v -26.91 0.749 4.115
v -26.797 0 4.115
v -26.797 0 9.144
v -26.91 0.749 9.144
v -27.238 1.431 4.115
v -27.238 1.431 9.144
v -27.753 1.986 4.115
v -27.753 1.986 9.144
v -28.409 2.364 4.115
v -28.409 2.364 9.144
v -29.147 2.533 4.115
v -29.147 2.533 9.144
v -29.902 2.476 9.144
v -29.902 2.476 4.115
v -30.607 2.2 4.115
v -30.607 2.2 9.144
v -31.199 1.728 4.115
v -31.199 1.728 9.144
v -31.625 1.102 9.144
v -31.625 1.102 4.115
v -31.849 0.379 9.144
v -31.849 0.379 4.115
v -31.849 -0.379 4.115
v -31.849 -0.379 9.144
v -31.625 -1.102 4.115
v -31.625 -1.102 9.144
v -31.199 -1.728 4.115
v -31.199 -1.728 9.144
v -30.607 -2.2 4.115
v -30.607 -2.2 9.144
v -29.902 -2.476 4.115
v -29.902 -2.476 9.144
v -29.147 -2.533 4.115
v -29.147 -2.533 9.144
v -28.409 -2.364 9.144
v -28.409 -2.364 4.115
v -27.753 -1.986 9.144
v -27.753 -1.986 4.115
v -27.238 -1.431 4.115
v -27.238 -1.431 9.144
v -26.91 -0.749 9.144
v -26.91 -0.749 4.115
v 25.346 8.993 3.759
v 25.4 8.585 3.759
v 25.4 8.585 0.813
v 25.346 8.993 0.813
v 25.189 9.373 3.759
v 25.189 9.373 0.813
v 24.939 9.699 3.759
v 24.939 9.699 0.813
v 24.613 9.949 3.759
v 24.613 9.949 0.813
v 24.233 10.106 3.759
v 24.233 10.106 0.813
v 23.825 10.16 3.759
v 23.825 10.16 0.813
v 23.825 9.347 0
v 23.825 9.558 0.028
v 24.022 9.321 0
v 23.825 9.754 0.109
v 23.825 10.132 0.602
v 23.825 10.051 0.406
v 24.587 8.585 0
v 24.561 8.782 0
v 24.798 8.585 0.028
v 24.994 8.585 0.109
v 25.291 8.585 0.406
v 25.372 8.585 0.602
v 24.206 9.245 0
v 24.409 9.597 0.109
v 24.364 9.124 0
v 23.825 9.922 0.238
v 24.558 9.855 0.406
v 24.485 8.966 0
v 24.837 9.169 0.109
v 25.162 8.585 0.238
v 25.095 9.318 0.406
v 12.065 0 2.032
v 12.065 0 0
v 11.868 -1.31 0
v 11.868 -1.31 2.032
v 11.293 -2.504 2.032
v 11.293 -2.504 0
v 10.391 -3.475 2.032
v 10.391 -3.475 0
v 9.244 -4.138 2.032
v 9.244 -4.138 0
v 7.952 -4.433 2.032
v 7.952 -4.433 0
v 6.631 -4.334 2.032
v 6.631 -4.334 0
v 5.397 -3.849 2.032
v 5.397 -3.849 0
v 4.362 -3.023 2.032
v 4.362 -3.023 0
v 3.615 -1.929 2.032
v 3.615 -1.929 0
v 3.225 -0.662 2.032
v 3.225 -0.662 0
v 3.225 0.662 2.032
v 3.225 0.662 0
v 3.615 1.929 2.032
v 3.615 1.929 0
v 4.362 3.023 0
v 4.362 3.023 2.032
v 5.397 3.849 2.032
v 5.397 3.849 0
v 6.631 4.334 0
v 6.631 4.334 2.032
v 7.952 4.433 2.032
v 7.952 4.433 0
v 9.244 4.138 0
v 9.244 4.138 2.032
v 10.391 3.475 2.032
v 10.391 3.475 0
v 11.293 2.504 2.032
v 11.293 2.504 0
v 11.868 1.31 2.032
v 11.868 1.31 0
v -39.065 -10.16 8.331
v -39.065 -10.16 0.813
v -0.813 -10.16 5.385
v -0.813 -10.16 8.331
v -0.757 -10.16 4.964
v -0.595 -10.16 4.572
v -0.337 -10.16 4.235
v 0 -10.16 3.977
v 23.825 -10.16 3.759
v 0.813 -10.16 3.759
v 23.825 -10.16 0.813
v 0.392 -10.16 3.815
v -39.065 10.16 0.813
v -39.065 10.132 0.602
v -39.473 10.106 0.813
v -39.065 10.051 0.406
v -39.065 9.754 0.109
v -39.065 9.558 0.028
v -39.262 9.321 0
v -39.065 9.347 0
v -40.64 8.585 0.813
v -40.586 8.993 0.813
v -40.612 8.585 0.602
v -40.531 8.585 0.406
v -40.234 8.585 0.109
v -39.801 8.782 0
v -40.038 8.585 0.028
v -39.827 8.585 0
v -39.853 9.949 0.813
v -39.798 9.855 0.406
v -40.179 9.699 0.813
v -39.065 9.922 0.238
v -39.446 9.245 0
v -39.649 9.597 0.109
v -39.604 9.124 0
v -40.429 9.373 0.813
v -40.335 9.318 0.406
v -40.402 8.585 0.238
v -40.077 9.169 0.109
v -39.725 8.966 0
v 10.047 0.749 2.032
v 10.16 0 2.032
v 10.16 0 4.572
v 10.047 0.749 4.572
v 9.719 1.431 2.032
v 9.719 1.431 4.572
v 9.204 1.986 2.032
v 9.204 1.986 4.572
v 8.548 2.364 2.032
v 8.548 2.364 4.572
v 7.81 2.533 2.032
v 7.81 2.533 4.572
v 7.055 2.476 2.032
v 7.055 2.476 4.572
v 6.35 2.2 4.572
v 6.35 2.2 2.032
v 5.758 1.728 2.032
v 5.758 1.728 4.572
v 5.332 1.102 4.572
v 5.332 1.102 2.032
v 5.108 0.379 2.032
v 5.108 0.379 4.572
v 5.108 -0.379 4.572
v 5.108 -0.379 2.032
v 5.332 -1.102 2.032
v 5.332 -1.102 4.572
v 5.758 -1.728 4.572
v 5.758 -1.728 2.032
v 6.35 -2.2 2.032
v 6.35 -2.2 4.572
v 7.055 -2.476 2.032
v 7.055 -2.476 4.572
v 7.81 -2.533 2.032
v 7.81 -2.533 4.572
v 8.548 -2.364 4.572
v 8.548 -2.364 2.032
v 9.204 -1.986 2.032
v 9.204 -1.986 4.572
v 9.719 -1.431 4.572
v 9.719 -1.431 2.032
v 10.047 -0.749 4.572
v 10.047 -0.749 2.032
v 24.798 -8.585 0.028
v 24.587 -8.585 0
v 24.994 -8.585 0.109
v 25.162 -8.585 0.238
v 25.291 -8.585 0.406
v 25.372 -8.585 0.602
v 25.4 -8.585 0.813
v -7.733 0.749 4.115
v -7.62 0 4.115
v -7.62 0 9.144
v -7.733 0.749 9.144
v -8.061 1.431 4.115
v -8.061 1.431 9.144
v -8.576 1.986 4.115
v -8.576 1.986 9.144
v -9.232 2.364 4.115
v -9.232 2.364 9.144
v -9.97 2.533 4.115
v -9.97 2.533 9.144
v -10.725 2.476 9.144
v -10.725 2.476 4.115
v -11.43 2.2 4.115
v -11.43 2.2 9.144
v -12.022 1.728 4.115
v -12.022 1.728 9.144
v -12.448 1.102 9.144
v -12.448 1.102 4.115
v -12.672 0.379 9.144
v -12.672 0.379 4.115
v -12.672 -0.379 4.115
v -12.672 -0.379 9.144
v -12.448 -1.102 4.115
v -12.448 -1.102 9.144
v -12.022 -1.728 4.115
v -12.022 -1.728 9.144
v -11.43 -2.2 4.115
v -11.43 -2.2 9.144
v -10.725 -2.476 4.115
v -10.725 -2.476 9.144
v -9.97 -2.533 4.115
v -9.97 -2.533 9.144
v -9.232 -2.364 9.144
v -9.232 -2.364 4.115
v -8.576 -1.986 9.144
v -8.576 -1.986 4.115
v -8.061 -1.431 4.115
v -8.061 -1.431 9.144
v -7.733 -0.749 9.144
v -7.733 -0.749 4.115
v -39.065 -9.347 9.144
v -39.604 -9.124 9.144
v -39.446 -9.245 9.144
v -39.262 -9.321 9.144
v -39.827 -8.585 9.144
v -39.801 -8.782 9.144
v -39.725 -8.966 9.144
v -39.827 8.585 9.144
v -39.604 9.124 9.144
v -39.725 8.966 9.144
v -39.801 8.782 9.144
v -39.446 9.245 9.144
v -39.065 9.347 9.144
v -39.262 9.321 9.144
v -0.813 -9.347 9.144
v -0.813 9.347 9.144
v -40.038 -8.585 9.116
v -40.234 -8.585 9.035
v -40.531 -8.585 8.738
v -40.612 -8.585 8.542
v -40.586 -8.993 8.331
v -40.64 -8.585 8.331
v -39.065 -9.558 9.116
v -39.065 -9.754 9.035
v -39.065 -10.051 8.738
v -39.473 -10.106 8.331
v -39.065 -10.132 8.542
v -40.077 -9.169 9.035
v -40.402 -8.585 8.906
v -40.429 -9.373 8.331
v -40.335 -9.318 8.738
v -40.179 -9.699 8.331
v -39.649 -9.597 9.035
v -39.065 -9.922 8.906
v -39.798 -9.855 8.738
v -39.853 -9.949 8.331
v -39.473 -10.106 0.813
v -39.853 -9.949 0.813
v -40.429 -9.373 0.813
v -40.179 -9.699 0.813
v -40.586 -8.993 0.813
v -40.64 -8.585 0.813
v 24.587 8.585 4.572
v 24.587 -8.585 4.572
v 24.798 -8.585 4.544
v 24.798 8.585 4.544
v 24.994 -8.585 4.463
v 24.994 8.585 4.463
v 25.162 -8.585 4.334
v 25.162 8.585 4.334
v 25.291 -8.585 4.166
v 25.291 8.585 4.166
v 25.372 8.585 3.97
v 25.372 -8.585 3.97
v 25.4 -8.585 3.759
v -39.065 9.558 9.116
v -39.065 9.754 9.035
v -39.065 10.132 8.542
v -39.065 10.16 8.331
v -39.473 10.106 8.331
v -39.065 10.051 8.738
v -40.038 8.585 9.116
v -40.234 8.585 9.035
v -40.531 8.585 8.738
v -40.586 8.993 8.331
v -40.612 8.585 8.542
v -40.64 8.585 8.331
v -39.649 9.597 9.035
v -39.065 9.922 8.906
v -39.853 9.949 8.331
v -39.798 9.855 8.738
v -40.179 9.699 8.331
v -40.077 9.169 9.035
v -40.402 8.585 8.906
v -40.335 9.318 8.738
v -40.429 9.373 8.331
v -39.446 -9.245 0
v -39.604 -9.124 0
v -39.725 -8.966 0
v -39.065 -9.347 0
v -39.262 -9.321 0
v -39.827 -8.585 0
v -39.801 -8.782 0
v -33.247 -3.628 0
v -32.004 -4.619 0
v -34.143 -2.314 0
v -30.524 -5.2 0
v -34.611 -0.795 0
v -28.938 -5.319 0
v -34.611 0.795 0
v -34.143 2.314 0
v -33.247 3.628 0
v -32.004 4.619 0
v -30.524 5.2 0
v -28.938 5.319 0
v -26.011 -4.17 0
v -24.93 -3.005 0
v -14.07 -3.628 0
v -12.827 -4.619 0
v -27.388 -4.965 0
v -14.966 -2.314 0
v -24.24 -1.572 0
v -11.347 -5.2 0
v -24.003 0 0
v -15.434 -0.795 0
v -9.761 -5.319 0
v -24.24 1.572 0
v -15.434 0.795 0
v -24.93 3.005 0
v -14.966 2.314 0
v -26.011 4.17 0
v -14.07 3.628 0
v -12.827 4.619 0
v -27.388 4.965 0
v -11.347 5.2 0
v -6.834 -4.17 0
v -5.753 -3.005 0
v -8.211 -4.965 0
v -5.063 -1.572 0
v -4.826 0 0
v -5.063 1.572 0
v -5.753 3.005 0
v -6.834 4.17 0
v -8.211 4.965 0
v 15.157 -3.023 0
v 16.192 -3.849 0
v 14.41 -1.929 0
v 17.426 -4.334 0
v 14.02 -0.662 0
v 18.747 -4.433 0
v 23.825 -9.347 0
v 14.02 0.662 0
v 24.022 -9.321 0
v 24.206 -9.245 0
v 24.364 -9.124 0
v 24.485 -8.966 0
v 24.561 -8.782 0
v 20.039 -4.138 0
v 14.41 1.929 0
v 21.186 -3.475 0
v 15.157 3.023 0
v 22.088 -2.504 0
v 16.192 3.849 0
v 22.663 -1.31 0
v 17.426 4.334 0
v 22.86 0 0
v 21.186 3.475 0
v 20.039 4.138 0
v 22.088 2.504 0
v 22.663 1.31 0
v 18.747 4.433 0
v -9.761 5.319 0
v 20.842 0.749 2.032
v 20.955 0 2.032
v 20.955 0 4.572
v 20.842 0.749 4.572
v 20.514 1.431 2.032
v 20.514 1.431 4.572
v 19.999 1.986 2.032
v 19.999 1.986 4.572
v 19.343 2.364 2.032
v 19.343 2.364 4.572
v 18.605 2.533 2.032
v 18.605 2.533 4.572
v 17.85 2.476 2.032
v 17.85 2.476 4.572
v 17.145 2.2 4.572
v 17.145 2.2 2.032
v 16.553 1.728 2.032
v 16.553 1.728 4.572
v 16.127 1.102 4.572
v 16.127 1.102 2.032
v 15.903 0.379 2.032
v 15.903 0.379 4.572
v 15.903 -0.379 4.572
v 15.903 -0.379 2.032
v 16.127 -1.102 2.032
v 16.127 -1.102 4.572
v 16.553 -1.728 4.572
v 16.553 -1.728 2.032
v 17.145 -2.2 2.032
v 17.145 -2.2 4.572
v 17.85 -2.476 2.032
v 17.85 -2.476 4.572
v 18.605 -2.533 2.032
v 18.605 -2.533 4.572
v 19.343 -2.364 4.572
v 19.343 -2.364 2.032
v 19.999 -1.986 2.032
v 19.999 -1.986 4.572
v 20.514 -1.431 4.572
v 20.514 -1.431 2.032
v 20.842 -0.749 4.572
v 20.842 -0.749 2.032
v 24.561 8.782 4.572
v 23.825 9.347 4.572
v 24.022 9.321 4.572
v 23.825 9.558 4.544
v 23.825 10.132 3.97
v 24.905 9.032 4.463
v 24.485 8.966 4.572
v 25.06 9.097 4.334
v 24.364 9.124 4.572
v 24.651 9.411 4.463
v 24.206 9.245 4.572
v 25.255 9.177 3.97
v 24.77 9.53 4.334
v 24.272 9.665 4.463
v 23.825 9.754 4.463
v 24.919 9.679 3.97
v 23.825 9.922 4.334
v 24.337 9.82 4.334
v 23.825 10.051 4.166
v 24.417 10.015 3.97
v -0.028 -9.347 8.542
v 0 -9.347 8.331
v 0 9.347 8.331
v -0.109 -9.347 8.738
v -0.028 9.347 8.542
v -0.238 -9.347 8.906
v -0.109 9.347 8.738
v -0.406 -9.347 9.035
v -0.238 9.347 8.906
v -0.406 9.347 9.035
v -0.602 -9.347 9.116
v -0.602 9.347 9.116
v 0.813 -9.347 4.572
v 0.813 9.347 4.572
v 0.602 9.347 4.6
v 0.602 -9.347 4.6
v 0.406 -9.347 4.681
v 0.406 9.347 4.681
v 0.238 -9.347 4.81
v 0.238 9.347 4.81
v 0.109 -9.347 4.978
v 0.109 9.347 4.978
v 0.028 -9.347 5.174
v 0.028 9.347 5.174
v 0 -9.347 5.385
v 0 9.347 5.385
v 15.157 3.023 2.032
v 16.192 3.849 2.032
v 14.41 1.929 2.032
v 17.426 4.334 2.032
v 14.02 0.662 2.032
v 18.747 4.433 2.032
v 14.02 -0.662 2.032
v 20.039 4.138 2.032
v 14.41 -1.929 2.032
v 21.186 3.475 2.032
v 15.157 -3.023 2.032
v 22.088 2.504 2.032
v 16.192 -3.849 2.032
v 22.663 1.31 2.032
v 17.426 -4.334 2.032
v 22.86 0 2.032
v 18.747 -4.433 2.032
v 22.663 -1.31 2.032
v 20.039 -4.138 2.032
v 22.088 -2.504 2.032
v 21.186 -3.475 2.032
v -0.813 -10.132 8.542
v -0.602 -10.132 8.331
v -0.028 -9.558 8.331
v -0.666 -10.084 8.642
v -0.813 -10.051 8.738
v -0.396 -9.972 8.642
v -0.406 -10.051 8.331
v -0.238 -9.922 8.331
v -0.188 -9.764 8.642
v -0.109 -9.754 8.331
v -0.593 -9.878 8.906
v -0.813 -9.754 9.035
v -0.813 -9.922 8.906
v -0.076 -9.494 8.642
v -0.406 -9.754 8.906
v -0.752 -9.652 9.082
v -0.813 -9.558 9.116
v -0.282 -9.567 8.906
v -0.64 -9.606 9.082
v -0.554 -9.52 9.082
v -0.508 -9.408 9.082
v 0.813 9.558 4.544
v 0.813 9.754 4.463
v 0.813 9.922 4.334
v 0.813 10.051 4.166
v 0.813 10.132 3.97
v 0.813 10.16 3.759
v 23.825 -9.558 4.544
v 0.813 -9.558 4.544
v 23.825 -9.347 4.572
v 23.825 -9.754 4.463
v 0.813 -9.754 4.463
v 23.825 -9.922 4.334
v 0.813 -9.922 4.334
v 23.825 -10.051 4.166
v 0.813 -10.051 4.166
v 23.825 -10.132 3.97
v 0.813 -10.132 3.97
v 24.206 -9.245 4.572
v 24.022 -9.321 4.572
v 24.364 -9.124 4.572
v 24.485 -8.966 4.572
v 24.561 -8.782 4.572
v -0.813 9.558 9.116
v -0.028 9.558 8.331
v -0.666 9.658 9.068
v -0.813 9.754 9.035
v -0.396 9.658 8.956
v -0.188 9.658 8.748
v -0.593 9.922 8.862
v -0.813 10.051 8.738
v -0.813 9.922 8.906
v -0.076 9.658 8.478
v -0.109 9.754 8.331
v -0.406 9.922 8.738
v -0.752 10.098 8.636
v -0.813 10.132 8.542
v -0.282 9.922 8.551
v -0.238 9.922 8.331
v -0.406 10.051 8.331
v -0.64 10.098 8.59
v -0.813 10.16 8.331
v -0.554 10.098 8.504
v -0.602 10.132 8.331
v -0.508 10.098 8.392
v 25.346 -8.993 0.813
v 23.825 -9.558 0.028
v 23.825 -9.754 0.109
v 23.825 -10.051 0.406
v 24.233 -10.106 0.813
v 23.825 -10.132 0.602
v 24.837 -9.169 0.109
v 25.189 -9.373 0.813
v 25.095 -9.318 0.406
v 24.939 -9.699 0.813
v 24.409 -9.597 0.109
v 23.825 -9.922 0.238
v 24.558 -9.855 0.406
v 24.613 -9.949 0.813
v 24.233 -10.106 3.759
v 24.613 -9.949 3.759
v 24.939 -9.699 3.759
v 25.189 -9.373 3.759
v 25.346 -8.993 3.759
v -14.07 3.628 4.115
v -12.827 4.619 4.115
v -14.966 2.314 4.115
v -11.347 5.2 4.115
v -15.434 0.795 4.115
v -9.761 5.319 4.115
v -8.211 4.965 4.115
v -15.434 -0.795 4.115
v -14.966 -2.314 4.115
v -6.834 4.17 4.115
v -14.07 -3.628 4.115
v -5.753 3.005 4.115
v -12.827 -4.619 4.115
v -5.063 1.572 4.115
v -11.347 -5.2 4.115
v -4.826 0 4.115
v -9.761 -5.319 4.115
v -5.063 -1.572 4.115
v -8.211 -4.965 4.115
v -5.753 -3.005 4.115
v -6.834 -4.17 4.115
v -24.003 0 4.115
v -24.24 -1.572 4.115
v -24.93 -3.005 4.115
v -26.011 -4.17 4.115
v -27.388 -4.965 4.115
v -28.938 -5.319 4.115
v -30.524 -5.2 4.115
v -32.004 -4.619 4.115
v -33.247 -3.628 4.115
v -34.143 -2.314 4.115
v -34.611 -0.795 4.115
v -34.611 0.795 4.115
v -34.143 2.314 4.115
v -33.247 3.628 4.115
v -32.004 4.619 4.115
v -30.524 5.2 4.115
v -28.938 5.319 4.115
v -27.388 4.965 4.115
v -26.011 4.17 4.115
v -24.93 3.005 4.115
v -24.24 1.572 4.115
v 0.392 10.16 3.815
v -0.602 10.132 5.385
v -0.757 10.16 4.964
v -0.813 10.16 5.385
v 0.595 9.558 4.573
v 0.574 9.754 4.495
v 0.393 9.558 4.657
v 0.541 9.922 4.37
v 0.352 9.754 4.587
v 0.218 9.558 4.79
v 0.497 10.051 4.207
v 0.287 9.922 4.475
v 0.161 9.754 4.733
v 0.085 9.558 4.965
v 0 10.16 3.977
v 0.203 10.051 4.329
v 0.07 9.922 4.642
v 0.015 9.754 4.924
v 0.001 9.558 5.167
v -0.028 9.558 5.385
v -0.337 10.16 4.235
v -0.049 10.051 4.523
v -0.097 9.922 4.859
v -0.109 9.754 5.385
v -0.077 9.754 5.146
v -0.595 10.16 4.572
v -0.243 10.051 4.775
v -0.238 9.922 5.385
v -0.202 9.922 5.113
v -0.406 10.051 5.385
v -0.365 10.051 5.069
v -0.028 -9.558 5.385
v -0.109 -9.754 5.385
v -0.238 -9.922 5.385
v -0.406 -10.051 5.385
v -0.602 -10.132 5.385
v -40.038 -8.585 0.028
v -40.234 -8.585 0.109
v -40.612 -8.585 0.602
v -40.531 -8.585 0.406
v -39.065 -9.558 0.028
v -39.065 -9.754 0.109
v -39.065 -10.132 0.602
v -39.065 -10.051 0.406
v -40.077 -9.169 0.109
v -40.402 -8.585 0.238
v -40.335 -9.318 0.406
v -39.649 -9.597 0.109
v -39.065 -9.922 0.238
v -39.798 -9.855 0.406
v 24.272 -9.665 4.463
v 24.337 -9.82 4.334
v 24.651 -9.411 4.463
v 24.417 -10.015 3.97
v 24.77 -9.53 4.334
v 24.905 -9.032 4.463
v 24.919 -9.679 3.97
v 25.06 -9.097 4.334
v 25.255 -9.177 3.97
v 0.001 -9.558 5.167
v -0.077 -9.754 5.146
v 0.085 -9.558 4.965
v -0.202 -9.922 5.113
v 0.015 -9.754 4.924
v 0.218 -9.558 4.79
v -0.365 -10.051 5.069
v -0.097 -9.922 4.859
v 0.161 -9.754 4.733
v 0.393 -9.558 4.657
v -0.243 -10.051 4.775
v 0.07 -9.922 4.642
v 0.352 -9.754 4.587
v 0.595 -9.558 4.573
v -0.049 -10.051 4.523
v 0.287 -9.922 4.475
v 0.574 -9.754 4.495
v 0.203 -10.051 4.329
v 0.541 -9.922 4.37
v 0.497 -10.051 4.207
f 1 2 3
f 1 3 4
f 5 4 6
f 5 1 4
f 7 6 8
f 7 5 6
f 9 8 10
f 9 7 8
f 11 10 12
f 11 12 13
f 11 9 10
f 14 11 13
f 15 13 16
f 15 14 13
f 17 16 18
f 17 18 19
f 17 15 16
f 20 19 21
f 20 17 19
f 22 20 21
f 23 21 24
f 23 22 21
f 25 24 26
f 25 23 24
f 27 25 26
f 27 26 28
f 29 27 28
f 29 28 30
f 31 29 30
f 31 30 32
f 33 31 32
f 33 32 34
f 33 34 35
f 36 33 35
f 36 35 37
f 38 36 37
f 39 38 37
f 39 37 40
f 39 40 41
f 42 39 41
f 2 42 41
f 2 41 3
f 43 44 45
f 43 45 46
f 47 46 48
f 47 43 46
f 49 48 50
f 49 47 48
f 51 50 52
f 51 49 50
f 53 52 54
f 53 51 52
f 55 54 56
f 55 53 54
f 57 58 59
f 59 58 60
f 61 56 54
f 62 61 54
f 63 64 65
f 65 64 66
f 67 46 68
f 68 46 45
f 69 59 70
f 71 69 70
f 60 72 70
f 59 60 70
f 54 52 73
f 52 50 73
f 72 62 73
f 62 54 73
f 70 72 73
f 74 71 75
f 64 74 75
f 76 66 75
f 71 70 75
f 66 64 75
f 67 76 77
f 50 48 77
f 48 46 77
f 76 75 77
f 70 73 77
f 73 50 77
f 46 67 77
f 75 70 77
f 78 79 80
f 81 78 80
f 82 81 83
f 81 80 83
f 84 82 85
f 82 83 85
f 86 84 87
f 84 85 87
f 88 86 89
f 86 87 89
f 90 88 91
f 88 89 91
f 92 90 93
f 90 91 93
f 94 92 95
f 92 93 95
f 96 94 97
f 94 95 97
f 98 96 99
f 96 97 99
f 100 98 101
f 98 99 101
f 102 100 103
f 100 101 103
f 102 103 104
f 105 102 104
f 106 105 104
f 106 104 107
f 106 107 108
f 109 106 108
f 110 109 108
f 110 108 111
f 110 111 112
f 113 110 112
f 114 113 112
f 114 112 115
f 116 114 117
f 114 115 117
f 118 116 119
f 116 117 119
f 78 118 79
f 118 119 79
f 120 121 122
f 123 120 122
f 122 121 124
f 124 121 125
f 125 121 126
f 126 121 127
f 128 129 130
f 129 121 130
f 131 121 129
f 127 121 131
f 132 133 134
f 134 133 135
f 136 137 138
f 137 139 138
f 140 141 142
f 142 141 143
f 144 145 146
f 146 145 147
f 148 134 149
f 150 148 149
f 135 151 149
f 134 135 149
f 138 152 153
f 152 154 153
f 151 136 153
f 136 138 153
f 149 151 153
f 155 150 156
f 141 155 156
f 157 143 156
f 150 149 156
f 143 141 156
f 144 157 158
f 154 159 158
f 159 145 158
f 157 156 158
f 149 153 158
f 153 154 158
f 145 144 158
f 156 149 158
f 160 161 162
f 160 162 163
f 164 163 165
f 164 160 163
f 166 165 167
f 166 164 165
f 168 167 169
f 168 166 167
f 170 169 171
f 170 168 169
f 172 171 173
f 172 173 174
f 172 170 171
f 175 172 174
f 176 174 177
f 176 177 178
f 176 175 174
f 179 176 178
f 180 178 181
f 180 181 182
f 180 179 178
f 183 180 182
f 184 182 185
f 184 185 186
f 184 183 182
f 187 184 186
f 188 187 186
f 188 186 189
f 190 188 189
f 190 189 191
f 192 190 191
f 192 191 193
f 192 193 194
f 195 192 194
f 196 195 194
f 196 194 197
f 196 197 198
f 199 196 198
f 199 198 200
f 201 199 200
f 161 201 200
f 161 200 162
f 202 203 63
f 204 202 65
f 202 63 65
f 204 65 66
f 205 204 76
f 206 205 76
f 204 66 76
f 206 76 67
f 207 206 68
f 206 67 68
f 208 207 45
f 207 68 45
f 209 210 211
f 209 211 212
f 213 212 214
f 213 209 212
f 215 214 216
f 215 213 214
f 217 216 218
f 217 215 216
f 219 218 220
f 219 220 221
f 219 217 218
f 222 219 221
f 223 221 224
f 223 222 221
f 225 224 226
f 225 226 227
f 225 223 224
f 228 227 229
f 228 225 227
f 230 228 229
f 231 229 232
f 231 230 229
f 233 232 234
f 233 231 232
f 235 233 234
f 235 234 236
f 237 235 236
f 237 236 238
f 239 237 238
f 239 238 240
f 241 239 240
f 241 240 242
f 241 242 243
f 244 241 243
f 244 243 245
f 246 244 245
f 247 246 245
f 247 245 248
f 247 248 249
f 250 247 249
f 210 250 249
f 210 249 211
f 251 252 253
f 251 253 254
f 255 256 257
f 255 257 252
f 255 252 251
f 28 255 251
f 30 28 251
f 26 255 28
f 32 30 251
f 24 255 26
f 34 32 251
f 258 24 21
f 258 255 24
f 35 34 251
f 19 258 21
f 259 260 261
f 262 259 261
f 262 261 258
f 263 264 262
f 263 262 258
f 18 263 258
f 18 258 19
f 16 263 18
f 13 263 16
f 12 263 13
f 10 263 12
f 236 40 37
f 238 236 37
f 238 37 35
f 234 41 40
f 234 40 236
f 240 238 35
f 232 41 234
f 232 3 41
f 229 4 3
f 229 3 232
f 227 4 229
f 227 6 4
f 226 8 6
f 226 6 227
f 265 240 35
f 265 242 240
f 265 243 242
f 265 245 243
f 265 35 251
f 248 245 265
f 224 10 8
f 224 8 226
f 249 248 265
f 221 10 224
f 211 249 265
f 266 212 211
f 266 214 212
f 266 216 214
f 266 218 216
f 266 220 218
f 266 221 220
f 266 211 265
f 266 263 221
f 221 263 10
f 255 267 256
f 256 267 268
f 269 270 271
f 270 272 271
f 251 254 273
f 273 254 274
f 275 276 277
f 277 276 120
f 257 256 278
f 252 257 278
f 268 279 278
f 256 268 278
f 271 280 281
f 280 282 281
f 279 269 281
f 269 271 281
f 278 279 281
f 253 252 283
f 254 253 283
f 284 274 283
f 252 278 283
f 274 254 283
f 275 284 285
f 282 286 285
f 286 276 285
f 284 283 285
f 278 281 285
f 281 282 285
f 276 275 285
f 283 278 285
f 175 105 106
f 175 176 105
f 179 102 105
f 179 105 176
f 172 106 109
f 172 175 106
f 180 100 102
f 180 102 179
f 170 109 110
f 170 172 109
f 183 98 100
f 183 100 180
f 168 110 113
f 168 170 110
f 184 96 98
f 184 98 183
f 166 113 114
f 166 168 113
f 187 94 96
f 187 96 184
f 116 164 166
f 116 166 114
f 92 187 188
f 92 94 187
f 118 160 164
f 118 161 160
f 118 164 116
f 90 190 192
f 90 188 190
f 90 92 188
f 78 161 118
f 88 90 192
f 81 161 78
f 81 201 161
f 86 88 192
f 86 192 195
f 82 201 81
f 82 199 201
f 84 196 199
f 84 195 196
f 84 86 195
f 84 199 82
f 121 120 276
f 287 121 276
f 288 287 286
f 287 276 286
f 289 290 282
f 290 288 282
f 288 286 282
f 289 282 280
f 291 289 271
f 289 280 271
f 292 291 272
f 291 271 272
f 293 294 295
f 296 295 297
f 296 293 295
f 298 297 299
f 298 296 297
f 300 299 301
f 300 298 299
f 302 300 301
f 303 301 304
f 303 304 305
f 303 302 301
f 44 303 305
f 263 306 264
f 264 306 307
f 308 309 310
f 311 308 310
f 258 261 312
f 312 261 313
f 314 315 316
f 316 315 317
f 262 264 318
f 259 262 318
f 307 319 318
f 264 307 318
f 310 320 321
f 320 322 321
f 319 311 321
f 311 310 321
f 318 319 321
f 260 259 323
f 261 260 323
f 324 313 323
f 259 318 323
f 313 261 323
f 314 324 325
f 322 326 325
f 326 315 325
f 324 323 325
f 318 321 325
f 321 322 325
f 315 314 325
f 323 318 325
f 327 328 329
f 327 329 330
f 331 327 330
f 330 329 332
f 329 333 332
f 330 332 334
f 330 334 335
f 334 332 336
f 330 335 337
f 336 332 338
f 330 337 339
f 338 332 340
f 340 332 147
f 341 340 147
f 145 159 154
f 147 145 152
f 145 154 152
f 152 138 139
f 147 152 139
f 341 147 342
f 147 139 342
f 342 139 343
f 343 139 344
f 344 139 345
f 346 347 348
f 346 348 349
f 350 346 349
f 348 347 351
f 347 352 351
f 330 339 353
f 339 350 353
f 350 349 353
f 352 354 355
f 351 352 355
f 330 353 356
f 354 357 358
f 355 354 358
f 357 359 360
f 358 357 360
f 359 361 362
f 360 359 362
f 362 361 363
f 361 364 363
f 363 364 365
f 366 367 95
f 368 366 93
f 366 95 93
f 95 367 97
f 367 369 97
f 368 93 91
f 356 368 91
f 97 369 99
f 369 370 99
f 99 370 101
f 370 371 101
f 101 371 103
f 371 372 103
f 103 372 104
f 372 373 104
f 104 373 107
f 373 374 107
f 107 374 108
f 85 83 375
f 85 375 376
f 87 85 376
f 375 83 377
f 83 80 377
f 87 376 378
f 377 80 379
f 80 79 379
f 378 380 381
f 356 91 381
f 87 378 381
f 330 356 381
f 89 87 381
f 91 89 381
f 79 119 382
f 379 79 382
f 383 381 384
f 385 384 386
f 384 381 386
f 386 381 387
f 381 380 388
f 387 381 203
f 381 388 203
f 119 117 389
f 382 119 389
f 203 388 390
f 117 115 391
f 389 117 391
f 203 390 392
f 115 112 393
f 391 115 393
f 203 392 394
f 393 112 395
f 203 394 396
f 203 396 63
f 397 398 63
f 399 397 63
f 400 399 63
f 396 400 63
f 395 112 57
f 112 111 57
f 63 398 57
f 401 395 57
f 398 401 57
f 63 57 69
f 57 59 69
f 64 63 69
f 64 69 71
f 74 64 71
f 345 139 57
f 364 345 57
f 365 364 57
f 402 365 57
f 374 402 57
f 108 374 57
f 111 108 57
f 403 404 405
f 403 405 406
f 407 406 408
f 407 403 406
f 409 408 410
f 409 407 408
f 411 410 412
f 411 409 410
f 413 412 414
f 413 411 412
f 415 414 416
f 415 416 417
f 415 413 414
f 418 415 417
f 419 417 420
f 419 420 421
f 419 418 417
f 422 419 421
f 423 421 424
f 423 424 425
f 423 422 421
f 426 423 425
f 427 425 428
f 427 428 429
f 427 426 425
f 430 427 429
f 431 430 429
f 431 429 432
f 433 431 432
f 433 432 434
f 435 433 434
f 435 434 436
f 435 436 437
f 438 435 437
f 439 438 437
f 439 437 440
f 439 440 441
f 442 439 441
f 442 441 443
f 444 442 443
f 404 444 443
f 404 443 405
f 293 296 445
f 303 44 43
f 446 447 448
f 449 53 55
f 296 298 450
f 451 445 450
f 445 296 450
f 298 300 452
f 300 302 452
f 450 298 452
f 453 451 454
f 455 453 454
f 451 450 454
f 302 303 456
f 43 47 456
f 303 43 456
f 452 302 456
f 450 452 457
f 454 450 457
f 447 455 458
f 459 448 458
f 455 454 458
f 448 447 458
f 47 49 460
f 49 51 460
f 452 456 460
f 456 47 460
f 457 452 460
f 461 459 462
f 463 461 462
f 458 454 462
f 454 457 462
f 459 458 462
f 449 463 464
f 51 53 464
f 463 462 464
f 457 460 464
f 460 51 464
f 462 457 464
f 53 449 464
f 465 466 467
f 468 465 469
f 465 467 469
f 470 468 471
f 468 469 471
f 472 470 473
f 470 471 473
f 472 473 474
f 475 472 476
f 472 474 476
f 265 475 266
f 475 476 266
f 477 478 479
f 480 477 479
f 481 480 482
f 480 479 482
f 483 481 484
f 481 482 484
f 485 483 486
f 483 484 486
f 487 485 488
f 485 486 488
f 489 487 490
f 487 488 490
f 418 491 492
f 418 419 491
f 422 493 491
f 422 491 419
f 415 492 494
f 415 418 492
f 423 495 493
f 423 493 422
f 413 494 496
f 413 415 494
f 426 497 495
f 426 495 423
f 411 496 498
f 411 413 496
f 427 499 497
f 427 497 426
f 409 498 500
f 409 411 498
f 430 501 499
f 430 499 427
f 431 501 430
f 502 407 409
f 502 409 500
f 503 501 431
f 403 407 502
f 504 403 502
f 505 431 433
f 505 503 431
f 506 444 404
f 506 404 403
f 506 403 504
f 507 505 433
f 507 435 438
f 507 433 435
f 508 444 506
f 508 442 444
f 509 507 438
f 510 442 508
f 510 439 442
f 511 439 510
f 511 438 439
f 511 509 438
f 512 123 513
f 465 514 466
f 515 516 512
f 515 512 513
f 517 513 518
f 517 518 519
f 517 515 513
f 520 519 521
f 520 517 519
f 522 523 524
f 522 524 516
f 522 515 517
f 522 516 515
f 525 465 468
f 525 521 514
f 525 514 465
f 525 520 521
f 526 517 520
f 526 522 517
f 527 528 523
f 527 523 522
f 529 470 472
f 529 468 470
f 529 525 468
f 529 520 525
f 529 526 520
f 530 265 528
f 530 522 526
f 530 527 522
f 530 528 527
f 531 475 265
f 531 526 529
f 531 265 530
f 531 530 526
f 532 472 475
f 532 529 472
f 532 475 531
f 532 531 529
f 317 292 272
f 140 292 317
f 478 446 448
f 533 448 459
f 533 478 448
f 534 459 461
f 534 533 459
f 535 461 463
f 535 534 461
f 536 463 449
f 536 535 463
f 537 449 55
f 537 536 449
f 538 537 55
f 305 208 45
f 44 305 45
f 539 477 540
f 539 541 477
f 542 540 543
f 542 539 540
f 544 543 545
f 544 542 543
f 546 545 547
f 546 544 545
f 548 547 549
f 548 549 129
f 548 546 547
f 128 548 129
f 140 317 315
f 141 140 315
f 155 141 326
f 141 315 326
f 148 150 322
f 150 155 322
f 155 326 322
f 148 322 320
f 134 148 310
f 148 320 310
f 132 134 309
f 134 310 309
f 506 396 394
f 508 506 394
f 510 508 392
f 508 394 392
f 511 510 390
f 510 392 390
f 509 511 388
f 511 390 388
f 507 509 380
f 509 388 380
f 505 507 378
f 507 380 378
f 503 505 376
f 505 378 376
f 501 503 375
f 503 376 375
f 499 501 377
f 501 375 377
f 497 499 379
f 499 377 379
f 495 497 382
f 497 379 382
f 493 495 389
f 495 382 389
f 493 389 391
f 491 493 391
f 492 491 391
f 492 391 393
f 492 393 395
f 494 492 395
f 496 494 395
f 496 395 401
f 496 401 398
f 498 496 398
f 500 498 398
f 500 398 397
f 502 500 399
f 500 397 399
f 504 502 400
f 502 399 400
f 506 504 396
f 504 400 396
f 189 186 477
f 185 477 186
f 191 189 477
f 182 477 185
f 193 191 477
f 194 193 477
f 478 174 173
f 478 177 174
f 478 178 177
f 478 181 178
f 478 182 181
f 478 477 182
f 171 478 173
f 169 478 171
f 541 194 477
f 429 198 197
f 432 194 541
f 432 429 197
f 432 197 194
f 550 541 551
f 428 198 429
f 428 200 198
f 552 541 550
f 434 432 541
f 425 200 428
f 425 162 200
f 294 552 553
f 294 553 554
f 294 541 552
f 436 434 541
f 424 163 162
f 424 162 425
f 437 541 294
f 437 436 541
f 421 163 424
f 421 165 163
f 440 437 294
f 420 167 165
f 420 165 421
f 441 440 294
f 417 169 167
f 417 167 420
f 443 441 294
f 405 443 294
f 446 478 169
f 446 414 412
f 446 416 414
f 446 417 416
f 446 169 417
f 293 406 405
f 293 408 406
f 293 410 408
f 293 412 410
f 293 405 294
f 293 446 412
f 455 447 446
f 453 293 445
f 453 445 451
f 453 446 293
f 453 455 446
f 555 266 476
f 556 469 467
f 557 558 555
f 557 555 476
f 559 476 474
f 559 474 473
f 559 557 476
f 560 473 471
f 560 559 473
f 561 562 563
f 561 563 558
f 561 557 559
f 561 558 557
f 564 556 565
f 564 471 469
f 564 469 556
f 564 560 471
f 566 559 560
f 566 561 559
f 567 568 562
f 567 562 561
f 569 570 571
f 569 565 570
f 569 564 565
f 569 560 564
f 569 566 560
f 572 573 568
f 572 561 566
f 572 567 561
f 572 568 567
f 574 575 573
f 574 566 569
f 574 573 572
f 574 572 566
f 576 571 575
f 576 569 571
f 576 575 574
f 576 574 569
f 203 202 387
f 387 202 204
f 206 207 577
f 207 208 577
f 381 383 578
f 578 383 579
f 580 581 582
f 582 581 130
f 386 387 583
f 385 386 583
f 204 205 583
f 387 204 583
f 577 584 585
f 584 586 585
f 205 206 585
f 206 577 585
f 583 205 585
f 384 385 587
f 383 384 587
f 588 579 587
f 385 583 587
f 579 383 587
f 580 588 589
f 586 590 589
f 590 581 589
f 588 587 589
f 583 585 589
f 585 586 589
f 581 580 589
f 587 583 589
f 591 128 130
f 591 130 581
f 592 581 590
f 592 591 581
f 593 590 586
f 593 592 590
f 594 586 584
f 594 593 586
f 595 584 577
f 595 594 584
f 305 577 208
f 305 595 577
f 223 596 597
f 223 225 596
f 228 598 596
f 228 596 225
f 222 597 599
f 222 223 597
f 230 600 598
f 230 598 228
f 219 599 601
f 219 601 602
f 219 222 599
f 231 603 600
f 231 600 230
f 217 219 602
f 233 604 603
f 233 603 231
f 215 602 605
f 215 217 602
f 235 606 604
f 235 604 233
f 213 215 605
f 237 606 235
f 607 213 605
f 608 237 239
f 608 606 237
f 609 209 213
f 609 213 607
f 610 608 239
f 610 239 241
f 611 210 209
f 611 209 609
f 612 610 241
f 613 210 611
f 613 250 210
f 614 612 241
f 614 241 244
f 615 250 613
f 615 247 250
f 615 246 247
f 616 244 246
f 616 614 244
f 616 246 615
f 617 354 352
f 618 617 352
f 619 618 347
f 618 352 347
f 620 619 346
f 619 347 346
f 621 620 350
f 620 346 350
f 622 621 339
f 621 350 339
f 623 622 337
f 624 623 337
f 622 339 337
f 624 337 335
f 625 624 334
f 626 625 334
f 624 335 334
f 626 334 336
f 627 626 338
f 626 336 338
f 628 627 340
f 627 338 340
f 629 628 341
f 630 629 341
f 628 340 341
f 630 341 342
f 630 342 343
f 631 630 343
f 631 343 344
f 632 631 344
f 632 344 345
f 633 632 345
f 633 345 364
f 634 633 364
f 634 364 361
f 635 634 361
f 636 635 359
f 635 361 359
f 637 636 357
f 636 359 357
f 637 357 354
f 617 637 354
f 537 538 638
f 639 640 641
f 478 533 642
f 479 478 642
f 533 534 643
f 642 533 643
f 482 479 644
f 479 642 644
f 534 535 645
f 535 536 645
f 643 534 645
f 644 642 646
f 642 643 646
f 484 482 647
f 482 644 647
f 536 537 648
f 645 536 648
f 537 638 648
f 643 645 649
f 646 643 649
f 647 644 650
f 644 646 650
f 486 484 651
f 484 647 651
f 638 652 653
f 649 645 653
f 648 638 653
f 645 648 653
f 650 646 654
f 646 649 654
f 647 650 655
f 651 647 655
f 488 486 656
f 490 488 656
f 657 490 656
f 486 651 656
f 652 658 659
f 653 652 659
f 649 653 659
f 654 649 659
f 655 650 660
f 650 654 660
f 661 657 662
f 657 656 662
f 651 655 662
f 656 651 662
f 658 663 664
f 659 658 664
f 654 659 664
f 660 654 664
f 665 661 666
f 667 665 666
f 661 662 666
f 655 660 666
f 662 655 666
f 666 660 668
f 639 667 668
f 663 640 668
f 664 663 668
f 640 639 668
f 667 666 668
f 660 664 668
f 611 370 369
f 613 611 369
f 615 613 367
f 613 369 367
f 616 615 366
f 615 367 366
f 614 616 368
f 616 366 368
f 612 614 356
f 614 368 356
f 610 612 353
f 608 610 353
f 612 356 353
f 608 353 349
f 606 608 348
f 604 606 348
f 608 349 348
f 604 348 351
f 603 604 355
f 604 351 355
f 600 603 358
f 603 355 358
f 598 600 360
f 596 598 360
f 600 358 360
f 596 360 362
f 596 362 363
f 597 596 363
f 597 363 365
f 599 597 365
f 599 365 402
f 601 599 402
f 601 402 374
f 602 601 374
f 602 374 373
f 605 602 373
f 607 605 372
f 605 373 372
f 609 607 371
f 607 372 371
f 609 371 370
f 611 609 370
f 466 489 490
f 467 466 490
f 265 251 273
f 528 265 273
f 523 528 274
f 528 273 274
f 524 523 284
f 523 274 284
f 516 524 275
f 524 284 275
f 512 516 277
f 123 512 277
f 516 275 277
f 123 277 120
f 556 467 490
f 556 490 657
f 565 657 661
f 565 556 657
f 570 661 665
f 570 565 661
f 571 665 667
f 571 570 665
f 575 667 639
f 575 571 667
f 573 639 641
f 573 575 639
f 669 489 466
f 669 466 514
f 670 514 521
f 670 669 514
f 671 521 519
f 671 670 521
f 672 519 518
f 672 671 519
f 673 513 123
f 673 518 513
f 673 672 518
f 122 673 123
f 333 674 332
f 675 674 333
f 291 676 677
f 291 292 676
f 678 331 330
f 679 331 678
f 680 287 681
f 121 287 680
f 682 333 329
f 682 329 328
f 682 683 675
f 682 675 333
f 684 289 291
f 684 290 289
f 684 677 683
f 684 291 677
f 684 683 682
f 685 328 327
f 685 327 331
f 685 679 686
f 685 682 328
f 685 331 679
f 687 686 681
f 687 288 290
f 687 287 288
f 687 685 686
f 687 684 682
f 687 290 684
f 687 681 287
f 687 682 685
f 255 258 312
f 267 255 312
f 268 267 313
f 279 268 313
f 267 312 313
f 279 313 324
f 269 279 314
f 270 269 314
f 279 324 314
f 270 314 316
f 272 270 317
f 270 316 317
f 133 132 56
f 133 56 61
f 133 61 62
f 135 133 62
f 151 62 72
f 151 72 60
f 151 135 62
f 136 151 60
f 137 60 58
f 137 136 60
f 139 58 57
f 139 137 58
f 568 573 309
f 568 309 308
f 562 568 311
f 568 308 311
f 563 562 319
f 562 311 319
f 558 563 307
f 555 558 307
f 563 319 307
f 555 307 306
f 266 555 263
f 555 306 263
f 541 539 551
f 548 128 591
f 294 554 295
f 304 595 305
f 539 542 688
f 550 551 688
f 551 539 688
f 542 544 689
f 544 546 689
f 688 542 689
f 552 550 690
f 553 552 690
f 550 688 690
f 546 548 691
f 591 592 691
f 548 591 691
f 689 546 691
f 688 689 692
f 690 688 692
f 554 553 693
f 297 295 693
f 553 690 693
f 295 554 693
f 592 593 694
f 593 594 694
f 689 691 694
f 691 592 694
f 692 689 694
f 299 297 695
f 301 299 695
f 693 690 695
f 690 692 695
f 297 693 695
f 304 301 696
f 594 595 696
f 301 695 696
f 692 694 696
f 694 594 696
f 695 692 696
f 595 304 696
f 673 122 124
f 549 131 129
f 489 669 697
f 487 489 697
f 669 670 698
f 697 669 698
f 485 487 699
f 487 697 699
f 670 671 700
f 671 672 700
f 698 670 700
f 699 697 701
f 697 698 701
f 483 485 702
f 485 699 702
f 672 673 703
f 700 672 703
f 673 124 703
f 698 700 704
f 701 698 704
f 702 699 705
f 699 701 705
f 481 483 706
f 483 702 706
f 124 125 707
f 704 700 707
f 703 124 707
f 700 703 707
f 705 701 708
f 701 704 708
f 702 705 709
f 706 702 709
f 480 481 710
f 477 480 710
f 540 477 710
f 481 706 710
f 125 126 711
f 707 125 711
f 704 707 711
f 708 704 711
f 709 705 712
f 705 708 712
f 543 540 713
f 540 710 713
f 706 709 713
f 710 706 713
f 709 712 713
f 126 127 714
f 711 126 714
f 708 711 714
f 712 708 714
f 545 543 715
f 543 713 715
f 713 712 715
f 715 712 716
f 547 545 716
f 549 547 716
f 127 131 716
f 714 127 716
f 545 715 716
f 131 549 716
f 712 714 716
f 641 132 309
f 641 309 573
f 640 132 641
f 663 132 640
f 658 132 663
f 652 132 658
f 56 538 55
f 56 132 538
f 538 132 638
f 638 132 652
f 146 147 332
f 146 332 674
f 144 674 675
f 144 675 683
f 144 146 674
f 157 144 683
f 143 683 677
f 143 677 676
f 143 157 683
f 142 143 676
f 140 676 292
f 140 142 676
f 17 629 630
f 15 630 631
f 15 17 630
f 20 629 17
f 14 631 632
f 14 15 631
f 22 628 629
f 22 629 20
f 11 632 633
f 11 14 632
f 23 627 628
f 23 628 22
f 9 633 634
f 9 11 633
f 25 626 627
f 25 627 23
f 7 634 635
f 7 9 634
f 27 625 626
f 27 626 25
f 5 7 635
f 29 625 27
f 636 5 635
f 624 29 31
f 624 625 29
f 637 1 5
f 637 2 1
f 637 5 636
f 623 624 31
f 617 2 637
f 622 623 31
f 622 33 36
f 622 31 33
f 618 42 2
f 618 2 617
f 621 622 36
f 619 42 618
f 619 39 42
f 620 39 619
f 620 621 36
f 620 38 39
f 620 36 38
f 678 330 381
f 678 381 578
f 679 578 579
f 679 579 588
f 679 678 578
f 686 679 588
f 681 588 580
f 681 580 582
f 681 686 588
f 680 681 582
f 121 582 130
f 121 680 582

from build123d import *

# Parameters (mm, degrees)
F0_W          = 40.64
F0_H          = 20.32
F0_R          = 2.54
F1_DEPTH      = 9.144
F2_W          = 25.4
F2_H          = 20.32
F2_R          = 2.54
F3_DEPTH      = 4.572
F4_R          = 5.334
F4_R_2        = 2.54
F5_DEPTH      = 4.1148
F6_R          = 4.445
F6_R_2        = 2.54
F7_DEPTH      = 2.032
F8_R          = 1.5748
F9_F1_R       = 0.8128
F9_F2_R       = 0.8128
F10_T1_DEPTH  = 38.2524
F10_T3_DEPTH  = 62.8904
F10_T5_DEPTH  = 17.1704
F10_S9_W      = 0.8128
F10_S9_H      = 0.8128
F10_T10_DEPTH = 0.8128
F10_S15_W     = 0.8128
F10_S15_H     = 0.8128
F10_T16_DEPTH = 0.8128
F10_T20_ANGLE = 90
F10_T22_ANGLE = 90
F10_T24_ANGLE = 90
F10_T26_ANGLE = 90
F10_T28_ANGLE = 90
F10_T30_ANGLE = 90


# Not quite as in the source:
# - a fillet or chamfer that OpenCascade refuses, or shapes differently, is made with other operations: its cross-section is extruded or revolved along the edge and cut away or added


with BuildPart() as f1:
    # F0 (on Top) → F1 (new body)
    with BuildSketch(Plane.XY):
        with Locations((-20.32, 0)):
            Rectangle(F0_W, F0_H)
        with Locations((-29.337, 0)):
            Circle(F0_R, mode=Mode.SUBTRACT)
        with Locations((-10.16, 0)):
            Circle(F0_R, mode=Mode.SUBTRACT)
    extrude(amount=F1_DEPTH)

    # F2 (on Top) → F3 (join)
    with BuildSketch(Plane.XY):
        with Locations((12.7, 0)):
            Rectangle(F2_W, F2_H)
        with Locations((7.62, 0)):
            Circle(F2_R, mode=Mode.SUBTRACT)
        with Locations((18.415, 0)):
            Circle(F2_R, mode=Mode.SUBTRACT)
    extrude(amount=F3_DEPTH)

    # F4 (on face) → F5 (cut)
    with BuildSketch(Plane(origin=(0, 0, 0), x_dir=(1, 0, 0), z_dir=(0, 0, -1))):
        with Locations((-29.337, 0)):
            Circle(F4_R)
        with Locations((-29.337, 0)):
            Circle(F4_R_2, mode=Mode.SUBTRACT)
        with Locations((-10.16, 0)):
            Circle(F4_R)
        with Locations((-10.16, 0)):
            Circle(F4_R_2, mode=Mode.SUBTRACT)
    extrude(amount=-F5_DEPTH, mode=Mode.SUBTRACT)

    # F6 (on face) → F7 (cut)
    with BuildSketch(Plane(origin=(0, 0, 0), x_dir=(1, 0, 0), z_dir=(0, 0, -1))):
        with Locations((7.62, 0)):
            Circle(F6_R)
        with Locations((7.62, 0)):
            Circle(F6_R_2, mode=Mode.SUBTRACT)
        with Locations((18.415, 0)):
            Circle(F6_R)
        with Locations((18.415, 0)):
            Circle(F6_R_2, mode=Mode.SUBTRACT)
    extrude(amount=-F7_DEPTH, mode=Mode.SUBTRACT)

    # F8
    f8_edges = [f1.edges().sort_by_distance(p)[0] for p in [
        (-40.64, 10.16, 4.572),
        (-40.64, -10.16, 4.572),
        (25.4, 10.16, 2.286),
        (25.4, -10.16, 2.286),
    ]]
    fillet(f8_edges, radius=F8_R)

    # F9: fillet of radius 0.8128 on 3 edges, made by hand

    # F9_f1
    f9_f1_edges = [f1.edges().sort_by_distance(p)[0] for p in [
        (0, 0, 4.572),
    ]]
    fillet(f9_f1_edges, radius=F9_F1_R)

    # F9_f2
    f9_f2_edges = [f1.edges().sort_by_distance(p)[0] for p in [
        (0, 10.16, 7.2644),
        (0, 0, 9.144),
        (0.2380636083, 10.16, 4.8100636083),
    ]]
    fillet(f9_f2_edges, radius=F9_F2_R)

    # F10: fillet of radius 0.8128 on 13 edges, made by hand

    # F10_s2 → F10_t1 (cut)
    with BuildSketch(Plane.YZ.offset(-39.0652)):
        with BuildLine():
            ThreePointArc((-9.3472, 9.144), (-9.9219363917, 8.9059363917), (-10.16, 8.3312))
            Line((-10.16, 8.3312), (-10.16, 9.144))
            Line((-10.16, 9.144), (-9.3472, 9.144))
        make_face()
        with BuildLine():
            ThreePointArc((10.16, 8.3312), (9.9219363917, 8.9059363917), (9.3472, 9.144))
            Line((9.3472, 9.144), (10.16, 9.144))
            Line((10.16, 9.144), (10.16, 8.3312))
        make_face()
    extrude(amount=F10_T1_DEPTH, mode=Mode.SUBTRACT)

    # F10_s4 → F10_t3 (cut)
    with BuildSketch(Plane.YZ.offset(-39.0652)):
        with BuildLine():
            ThreePointArc((10.16, 0.8128), (9.9219363917, 0.2380636083), (9.3472, 0))
            Line((9.3472, 0), (10.16, 0))
            Line((10.16, 0), (10.16, 0.8128))
        make_face()
        with BuildLine():
            ThreePointArc((-9.3472, 0), (-9.9219363917, 0.2380636083), (-10.16, 0.8128))
            Line((-10.16, 0.8128), (-10.16, 0))
            Line((-10.16, 0), (-9.3472, 0))
        make_face()
    extrude(amount=F10_T3_DEPTH, mode=Mode.SUBTRACT)

    # F10_s6 → F10_t5 (cut)
    with BuildSketch(Plane.XZ.offset(-8.5852)):
        with BuildLine():
            ThreePointArc((-39.8272, 9.144), (-40.4019363917, 8.9059363917), (-40.64, 8.3312))
            Line((-40.64, 8.3312), (-40.64, 9.144))
            Line((-40.64, 9.144), (-39.8272, 9.144))
        make_face()
        with BuildLine():
            ThreePointArc((-39.8272, 0), (-40.4019363917, 0.2380636083), (-40.64, 0.8128))
            Line((-40.64, 0.8128), (-40.64, 0))
            Line((-40.64, 0), (-39.8272, 0))
        make_face()
        with BuildLine():
            ThreePointArc((24.5872, 0), (25.1619363917, 0.2380636083), (25.4, 0.8128))
            Line((25.4, 0.8128), (25.4, 0))
            Line((25.4, 0), (24.5872, 0))
        make_face()
    extrude(amount=F10_T5_DEPTH, mode=Mode.SUBTRACT)


with BuildPart() as f10_tool8:
    # F10_s9 → F10_t10 (new body)
    with BuildSketch(Plane.XZ.offset(-9.3472)):
        with Locations((-0.4064, 8.7376)):
            Rectangle(F10_S9_W, F10_S9_H)
    extrude(amount=-F10_T10_DEPTH)

    # F10_s11 → F10_t12 (revolve, cut)
    with BuildSketch(Plane(origin=(-0.8128, 9.3472, 8.3312), x_dir=(-0.7071067812, 0, -0.7071067812), z_dir=(0.7071067812, 0, -0.7071067812))):
        with BuildLine():
            ThreePointArc((0, -0.8128), (0.8128, 0), (0, 0.8128))
            Line((0, 0.8128), (0, -0.8128))
        make_face()
    revolve(axis=Axis((-0.8128, 9.3472, 8.3312), (0, 1, 0)), mode=Mode.SUBTRACT)


with BuildPart() as f1_1:
    add(f1.part)

    # F10_t7: cut F10_tool8
    add(f10_tool8.part, mode=Mode.SUBTRACT)


with BuildPart() as f10_tool14:
    # F10_s15 → F10_t16 (new body)
    with BuildSketch(Plane.XY.offset(8.3312)):
        with Locations((-0.4064, -9.7536)):
            Rectangle(F10_S15_W, F10_S15_H)
    extrude(amount=F10_T16_DEPTH)

    # F10_s17 → F10_t18 (revolve, cut)
    with BuildSketch(Plane(origin=(-0.8128, -9.3472, 8.3312), x_dir=(-0.7071067812, 0.7071067812, 0), z_dir=(0.7071067812, 0.7071067812, 0))):
        with BuildLine():
            ThreePointArc((0, -0.8128), (0.8128, 0), (0, 0.8128))
            Line((0, 0.8128), (0, -0.8128))
        make_face()
    revolve(axis=Axis((-0.8128, -9.3472, 8.3312), (0, 0, 1)), mode=Mode.SUBTRACT)


with BuildPart() as f1_2:
    add(f1_1.part)

    # F10_t13: cut F10_tool14
    add(f10_tool14.part, mode=Mode.SUBTRACT)

    # F10_s19 → F10_t20 (revolve, cut)
    with BuildSketch(Plane.YZ.offset(-39.0652)):
        with BuildLine():
            ThreePointArc((9.3472, 9.144), (9.9219363917, 8.9059363917), (10.16, 8.3312))
            Line((10.16, 8.3312), (10.16, 9.144))
            Line((10.16, 9.144), (9.3472, 9.144))
        make_face()
    revolve(axis=Axis((-39.0652, 8.5852, 9.144), (0, 0, 1)), revolution_arc=F10_T20_ANGLE, mode=Mode.SUBTRACT)

    # F10_s21 → F10_t22 (revolve, cut)
    with BuildSketch(Plane.XZ.offset(8.5852)):
        with BuildLine():
            ThreePointArc((-39.8272, 9.144), (-40.4019363917, 8.9059363917), (-40.64, 8.3312))
            Line((-40.64, 8.3312), (-40.64, 9.144))
            Line((-40.64, 9.144), (-39.8272, 9.144))
        make_face()
    revolve(axis=Axis((-39.0652, -8.5852, 9.144), (0, 0, 1)), revolution_arc=F10_T22_ANGLE, mode=Mode.SUBTRACT)

    # F10_s23 → F10_t24 (revolve, cut)
    with BuildSketch(Plane.YZ.offset(-39.0652)):
        with BuildLine():
            ThreePointArc((10.16, 0.8128), (9.9219363917, 0.2380636083), (9.3472, 0))
            Line((9.3472, 0), (10.16, 0))
            Line((10.16, 0), (10.16, 0.8128))
        make_face()
    revolve(axis=Axis((-39.0652, 8.5852, 0), (0, 0, 1)), revolution_arc=F10_T24_ANGLE, mode=Mode.SUBTRACT)

    # F10_s25 → F10_t26 (revolve, cut)
    with BuildSketch(Plane.XZ.offset(8.5852)):
        with BuildLine():
            ThreePointArc((-39.8272, 0), (-40.4019363917, 0.2380636083), (-40.64, 0.8128))
            Line((-40.64, 0.8128), (-40.64, 0))
            Line((-40.64, 0), (-39.8272, 0))
        make_face()
    revolve(axis=Axis((-39.0652, -8.5852, 0), (0, 0, 1)), revolution_arc=F10_T26_ANGLE, mode=Mode.SUBTRACT)

    # F10_s27 → F10_t28 (revolve, cut)
    with BuildSketch(Plane.YZ.offset(23.8252)):
        with BuildLine():
            ThreePointArc((9.3472, 0), (9.9219363917, 0.2380636083), (10.16, 0.8128))
            Line((10.16, 0.8128), (10.16, 0))
            Line((10.16, 0), (9.3472, 0))
        make_face()
    revolve(axis=Axis((23.8252, 8.5852, 0), (0, 0, -1)), revolution_arc=F10_T28_ANGLE, mode=Mode.SUBTRACT)

    # F10_s29 → F10_t30 (revolve, cut)
    with BuildSketch(Plane.XZ.offset(8.5852)):
        with BuildLine():
            ThreePointArc((24.5872, 0), (25.1619363917, 0.2380636083), (25.4, 0.8128))
            Line((25.4, 0.8128), (25.4, 0))
            Line((25.4, 0), (24.5872, 0))
        make_face()
    revolve(axis=Axis((23.8252, -8.5852, 0), (0, 0, -1)), revolution_arc=F10_T30_ANGLE, mode=Mode.SUBTRACT)


solid = f1_2.part
